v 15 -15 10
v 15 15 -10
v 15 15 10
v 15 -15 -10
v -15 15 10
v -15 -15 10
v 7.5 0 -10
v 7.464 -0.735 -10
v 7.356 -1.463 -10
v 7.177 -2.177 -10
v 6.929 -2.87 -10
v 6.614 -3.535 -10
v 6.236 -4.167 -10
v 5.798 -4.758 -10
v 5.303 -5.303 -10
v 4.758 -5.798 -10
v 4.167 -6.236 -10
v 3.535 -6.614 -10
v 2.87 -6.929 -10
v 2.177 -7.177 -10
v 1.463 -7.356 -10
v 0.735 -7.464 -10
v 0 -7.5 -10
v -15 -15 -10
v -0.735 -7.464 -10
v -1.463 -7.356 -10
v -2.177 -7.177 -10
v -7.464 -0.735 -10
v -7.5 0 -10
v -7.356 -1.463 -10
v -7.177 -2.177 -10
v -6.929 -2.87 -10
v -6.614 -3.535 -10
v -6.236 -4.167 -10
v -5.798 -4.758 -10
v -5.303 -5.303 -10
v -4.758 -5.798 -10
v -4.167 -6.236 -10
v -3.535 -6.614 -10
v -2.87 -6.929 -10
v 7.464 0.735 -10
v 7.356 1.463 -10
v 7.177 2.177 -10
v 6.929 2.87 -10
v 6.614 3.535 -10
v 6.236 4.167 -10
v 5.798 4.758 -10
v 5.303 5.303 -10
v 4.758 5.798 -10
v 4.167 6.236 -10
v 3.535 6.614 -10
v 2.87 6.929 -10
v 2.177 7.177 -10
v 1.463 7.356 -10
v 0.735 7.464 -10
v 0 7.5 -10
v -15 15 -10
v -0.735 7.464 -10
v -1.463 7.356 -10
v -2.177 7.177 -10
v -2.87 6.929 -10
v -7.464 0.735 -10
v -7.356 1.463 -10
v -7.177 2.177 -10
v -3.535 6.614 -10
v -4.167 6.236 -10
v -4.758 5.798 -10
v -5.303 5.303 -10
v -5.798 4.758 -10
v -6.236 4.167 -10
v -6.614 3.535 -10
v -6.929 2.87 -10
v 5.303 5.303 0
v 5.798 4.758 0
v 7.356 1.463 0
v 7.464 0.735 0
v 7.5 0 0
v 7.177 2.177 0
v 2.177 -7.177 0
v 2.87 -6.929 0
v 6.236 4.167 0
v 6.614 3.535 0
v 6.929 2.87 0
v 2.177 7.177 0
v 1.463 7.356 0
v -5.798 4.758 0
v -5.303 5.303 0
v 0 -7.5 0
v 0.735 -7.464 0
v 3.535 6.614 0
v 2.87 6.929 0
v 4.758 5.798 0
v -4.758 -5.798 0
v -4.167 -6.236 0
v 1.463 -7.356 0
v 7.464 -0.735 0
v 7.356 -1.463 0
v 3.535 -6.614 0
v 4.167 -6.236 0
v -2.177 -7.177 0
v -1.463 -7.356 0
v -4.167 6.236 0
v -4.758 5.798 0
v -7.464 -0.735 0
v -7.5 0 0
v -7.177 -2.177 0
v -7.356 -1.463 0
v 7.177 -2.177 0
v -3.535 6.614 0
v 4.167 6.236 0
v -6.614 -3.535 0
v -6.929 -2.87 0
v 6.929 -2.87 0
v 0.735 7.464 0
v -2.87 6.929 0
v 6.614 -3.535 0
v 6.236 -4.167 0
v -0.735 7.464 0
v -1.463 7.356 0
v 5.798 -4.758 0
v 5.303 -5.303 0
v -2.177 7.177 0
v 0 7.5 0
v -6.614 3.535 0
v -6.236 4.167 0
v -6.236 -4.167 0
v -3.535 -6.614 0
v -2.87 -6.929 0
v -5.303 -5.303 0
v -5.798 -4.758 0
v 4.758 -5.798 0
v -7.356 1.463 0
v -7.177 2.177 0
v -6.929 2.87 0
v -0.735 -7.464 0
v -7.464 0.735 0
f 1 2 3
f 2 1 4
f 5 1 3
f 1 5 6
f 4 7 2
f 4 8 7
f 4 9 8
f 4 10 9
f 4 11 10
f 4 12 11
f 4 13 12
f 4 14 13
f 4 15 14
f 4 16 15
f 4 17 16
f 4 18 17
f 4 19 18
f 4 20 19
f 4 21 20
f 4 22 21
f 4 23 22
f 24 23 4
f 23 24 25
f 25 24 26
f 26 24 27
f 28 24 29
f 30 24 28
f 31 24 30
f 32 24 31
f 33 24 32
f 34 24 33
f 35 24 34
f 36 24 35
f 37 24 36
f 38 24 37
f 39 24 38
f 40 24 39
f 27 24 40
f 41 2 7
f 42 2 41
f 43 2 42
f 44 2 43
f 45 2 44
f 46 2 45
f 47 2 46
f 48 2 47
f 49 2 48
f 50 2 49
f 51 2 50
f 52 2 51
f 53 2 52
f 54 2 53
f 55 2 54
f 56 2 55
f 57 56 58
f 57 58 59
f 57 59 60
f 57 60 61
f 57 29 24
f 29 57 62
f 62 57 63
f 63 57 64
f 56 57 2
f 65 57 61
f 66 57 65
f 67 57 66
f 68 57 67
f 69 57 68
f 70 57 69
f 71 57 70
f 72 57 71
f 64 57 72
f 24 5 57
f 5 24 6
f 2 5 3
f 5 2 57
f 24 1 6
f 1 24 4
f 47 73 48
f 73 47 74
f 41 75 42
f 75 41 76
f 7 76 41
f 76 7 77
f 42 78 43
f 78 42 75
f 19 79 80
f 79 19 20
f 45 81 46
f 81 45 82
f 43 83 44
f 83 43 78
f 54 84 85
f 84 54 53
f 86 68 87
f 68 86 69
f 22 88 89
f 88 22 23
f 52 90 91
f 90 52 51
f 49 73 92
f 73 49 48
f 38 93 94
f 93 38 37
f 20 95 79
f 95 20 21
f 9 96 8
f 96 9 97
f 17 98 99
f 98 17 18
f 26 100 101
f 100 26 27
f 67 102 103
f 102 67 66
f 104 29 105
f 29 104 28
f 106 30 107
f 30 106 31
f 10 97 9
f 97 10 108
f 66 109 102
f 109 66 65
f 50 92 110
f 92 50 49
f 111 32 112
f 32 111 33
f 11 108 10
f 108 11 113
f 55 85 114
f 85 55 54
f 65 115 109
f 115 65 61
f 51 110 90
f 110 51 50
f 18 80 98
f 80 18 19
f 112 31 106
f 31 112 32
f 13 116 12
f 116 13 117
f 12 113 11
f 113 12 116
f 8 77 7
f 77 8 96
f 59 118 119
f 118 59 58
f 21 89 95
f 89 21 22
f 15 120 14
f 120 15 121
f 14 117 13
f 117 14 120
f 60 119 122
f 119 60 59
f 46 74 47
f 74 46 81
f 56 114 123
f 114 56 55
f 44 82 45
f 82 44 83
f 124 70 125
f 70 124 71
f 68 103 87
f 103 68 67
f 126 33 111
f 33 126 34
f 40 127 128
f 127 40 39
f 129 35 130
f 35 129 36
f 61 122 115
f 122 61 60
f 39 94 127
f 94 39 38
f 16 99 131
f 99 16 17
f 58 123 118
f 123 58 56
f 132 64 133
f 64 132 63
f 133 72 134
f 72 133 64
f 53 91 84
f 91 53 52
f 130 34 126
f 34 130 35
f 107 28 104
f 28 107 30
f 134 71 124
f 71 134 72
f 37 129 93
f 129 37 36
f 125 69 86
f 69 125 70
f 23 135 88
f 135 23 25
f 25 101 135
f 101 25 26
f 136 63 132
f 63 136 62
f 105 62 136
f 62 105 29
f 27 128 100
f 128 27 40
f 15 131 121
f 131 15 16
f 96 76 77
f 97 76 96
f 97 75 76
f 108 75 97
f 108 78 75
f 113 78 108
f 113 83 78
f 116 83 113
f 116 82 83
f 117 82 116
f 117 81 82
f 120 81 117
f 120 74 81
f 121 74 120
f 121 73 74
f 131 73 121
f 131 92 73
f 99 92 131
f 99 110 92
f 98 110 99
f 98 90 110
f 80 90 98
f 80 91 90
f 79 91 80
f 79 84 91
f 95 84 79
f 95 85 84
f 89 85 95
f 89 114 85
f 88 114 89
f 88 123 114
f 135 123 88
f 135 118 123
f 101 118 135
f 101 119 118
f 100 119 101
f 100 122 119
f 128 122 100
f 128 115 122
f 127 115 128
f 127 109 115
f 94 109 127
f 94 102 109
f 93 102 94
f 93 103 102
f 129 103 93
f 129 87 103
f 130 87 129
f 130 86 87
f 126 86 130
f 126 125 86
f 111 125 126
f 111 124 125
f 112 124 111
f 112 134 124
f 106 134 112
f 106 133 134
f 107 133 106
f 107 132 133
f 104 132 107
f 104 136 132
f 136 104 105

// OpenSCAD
$fn=64;

module lm8uu_holder() {
    difference() {
        // Outer block
        cube([30, 30, 20], center=true);
        
        // Hole for the bearing
        translate([0, 0, -10])
            cylinder(h=20, d=15, center=true);
    }
}

lm8uu_holder();
